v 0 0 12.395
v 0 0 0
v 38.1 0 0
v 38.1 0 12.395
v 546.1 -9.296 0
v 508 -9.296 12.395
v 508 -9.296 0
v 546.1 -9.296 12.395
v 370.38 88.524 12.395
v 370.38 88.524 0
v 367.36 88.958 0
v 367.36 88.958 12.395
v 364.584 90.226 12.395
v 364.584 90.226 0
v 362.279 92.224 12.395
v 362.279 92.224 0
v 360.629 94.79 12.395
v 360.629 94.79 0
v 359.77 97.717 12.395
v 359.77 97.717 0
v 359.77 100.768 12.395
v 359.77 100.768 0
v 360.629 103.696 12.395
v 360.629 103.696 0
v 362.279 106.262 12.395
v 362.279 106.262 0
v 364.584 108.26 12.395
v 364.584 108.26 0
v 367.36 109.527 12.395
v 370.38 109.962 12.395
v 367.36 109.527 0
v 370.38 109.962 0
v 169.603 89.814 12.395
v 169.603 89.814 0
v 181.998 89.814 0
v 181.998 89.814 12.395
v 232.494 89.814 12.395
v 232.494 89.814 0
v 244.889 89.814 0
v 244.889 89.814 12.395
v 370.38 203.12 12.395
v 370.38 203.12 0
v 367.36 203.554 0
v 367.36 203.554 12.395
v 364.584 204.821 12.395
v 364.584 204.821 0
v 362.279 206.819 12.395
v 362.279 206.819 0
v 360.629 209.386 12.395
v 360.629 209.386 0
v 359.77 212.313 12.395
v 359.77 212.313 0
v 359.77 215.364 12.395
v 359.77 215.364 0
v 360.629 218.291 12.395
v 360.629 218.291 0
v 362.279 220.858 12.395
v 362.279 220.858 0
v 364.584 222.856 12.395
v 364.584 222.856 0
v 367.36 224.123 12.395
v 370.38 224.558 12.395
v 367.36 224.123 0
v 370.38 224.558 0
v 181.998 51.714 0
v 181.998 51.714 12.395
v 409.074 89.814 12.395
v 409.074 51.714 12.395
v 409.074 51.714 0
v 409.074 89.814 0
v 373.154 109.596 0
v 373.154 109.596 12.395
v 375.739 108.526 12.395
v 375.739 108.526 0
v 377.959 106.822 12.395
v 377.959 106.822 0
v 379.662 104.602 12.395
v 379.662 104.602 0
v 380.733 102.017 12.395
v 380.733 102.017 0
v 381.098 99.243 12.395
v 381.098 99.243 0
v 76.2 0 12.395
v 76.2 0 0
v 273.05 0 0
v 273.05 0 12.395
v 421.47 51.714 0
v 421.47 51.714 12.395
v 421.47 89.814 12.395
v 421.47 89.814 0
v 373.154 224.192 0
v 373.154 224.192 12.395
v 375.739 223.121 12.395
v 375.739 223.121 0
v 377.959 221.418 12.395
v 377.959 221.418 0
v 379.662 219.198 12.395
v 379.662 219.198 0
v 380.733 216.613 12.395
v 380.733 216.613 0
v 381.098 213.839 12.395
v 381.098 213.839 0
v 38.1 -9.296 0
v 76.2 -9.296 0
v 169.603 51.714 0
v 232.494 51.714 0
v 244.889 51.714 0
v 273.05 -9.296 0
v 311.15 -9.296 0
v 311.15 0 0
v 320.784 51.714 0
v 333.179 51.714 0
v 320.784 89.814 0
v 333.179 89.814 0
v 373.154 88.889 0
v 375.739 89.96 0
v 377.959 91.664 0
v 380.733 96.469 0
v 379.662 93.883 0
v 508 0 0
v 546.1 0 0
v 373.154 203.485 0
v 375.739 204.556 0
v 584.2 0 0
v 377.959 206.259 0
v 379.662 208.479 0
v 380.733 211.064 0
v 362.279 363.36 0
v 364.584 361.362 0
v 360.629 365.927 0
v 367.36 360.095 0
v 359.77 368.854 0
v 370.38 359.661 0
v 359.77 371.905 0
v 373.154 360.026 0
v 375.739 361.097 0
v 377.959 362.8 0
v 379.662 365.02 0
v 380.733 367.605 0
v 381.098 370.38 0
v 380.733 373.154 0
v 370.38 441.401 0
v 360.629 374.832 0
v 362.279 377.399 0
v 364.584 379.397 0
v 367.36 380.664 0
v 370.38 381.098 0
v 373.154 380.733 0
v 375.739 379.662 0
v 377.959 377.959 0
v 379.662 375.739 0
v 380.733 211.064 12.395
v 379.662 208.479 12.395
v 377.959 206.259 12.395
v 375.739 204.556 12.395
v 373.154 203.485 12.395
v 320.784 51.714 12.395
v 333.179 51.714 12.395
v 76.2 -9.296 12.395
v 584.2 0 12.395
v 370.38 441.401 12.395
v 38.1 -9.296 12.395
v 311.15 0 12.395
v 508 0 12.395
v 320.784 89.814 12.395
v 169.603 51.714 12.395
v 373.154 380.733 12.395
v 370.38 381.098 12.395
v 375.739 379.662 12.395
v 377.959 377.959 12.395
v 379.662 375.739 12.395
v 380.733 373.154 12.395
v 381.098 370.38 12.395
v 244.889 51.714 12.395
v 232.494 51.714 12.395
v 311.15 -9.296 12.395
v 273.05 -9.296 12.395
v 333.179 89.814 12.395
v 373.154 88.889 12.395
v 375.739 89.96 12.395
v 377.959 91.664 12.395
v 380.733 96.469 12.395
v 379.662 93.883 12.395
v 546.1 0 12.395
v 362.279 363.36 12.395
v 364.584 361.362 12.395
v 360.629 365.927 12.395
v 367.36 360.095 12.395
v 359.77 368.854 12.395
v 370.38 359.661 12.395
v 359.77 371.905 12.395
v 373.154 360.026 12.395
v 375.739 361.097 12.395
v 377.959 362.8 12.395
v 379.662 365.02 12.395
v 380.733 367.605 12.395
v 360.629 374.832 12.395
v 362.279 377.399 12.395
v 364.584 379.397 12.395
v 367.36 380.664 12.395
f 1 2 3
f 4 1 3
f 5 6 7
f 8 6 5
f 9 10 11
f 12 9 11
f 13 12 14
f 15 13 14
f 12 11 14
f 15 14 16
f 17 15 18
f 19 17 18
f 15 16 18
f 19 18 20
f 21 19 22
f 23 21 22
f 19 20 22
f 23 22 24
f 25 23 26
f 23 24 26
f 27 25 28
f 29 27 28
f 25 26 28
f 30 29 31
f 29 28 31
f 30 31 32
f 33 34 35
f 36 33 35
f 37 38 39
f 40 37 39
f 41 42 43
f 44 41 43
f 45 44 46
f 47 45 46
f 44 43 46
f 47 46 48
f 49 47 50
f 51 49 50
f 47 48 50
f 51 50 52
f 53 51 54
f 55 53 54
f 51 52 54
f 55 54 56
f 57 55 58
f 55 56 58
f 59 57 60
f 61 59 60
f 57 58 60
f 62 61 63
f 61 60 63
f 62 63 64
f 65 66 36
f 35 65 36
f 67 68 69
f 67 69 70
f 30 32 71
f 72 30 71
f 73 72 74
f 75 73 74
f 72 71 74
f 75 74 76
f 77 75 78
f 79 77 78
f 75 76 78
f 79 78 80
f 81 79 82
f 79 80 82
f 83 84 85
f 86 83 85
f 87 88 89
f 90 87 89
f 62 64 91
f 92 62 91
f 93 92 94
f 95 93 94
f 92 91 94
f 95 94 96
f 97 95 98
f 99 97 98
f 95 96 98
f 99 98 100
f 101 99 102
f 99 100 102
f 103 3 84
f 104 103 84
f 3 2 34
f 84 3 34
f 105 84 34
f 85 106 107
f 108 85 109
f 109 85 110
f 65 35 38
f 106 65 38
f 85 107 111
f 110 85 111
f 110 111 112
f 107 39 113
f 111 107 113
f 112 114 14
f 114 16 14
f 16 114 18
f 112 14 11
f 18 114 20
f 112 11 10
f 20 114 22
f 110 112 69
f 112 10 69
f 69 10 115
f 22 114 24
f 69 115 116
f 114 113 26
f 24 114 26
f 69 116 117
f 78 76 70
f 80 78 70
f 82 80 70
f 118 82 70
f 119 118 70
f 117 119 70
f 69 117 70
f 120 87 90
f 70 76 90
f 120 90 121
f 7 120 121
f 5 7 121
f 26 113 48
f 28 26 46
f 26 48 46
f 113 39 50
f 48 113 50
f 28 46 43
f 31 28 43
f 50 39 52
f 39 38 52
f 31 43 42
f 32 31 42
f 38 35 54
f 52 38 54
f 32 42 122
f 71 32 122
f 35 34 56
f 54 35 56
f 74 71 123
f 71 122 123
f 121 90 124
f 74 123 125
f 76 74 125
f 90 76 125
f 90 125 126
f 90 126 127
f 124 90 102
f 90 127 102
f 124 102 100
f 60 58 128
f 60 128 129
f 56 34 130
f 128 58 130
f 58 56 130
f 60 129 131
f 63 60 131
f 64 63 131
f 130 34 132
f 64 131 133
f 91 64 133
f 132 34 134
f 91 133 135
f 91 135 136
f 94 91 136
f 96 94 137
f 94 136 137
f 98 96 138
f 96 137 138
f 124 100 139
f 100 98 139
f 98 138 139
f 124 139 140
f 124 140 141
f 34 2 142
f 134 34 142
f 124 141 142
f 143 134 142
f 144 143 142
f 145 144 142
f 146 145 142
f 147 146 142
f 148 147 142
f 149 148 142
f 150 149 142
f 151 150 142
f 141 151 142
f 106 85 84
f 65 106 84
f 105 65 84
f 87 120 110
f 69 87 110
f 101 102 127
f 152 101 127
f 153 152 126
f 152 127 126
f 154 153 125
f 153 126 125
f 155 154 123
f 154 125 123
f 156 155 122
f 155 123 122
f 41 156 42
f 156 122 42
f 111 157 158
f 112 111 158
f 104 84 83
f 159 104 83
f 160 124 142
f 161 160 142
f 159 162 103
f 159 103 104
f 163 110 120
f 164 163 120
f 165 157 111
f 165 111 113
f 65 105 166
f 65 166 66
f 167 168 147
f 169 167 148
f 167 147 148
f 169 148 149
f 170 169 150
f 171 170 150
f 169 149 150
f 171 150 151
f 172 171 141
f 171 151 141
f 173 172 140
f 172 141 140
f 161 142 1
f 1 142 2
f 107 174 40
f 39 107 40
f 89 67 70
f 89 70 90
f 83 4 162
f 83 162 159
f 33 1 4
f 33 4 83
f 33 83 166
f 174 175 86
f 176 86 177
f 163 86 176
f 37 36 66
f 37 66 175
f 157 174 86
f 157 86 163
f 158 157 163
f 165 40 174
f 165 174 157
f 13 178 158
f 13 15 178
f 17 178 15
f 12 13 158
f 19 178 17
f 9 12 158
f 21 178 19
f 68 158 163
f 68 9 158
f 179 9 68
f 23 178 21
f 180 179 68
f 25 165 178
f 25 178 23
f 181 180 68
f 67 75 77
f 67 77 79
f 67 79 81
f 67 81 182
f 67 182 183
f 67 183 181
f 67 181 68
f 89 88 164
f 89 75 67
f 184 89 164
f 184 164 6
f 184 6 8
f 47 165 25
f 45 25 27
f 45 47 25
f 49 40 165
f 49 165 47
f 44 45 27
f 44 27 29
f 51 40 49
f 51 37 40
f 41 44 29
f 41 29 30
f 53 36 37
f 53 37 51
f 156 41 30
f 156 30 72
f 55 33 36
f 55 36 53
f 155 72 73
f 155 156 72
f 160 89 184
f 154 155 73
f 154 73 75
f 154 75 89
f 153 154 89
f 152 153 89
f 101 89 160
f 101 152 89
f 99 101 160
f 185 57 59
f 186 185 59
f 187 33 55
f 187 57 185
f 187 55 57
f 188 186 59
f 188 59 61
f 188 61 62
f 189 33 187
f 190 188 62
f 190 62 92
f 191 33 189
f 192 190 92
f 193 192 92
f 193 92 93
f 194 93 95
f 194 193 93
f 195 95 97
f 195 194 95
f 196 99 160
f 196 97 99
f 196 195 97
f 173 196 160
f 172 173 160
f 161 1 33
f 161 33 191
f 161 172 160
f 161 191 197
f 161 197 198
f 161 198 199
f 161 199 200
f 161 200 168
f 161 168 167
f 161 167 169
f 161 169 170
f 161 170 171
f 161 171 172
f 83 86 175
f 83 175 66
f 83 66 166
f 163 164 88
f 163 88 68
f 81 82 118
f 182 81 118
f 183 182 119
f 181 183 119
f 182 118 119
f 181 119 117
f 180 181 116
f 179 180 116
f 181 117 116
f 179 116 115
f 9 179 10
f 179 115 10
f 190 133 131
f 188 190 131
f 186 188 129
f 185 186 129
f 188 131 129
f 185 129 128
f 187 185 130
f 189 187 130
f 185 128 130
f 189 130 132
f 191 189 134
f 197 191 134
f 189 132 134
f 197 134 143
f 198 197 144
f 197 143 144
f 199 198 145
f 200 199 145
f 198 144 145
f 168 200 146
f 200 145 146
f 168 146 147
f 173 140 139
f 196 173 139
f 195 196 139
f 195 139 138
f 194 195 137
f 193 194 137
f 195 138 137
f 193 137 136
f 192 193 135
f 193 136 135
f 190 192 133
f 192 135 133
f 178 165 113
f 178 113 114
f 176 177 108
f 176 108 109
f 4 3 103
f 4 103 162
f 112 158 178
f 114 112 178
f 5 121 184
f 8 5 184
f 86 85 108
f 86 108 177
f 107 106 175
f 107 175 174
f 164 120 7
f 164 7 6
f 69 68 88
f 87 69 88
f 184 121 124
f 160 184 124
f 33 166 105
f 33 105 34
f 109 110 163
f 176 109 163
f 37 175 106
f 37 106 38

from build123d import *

# Parameters (mm, degrees)
F1_DEPTH = 12.3952
F2_W     = 38.1
F2_H     = 12.3952
F3_DEPTH = 9.2964
F4_W     = 12.3952
F4_H     = 38.1
F5_DEPTH = 12.3952


with BuildPart() as f1:
    # F0 (on Top) → F1 (new body)
    with BuildSketch(Plane.XY):
        with BuildLine():
            Line((370.379511, 441.401113), (0, 0))
            Line((0, 0), (370.379511, 0))
            Line((370.379511, 0), (370.379511, 88.52408))
            ThreePointArc((370.379511, 88.52408), (359.660711, 99.24288), (370.379511, 109.96168))
            Line((370.379511, 109.96168), (370.379511, 203.119918))
            ThreePointArc((370.379511, 203.119918), (359.660711, 213.838718), (370.379511, 224.557518))
            Line((370.379511, 224.557518), (370.379511, 359.660723))
            ThreePointArc((370.379511, 359.660723), (359.660711, 370.379523), (370.379511, 381.098323))
            Line((370.379511, 381.098323), (370.379511, 441.401113))
        make_face()
        with BuildLine():
            Line((370.379511, 88.52408), (370.379511, 0))
            Line((370.379511, 0), (584.2, 0))
            Line((584.2, 0), (370.379511, 441.401113))
            Line((370.379511, 441.401113), (370.379511, 381.098323))
            ThreePointArc((370.379511, 381.098323), (377.958847, 377.95886), (381.098311, 370.379523))
            ThreePointArc((381.098311, 370.379523), (377.958847, 362.800187), (370.379511, 359.660723))
            Line((370.379511, 359.660723), (370.379511, 224.557518))
            ThreePointArc((370.379511, 224.557518), (377.958847, 221.418054), (381.098311, 213.838718))
            ThreePointArc((381.098311, 213.838718), (377.958847, 206.259381), (370.379511, 203.119918))
            Line((370.379511, 203.119918), (370.379511, 109.96168))
            ThreePointArc((370.379511, 109.96168), (377.958847, 106.822216), (381.098311, 99.24288))
            ThreePointArc((381.098311, 99.24288), (377.958847, 91.663544), (370.379511, 88.52408))
        make_face()
    extrude(amount=F1_DEPTH)

    # F2 (on face) → F3 (join)
    with BuildSketch(Plane.XZ):
        with Locations((57.15, 6.1976)):
            Rectangle(F2_W, F2_H)
        with Locations((292.1, 6.1976)):
            Rectangle(F2_W, F2_H)
        with Locations((527.05, 6.1976)):
            Rectangle(F2_W, F2_H)
    extrude(amount=F3_DEPTH)

    # F4 (on face) → F5 (cut, through all)
    with BuildSketch(Plane.XY.offset(12.3952)):
        with Locations((238.691288, 70.7644)):
            Rectangle(F4_W, F4_H)
        with Locations((326.981688, 70.7644)):
            Rectangle(F4_W, F4_H)
        with Locations((415.272088, 70.7644)):
            Rectangle(F4_W, F4_H)
        with Locations((175.800888, 70.7644)):
            Rectangle(F4_W, F4_H)
    extrude(amount=-F5_DEPTH, mode=Mode.SUBTRACT)


solid = f1.part
